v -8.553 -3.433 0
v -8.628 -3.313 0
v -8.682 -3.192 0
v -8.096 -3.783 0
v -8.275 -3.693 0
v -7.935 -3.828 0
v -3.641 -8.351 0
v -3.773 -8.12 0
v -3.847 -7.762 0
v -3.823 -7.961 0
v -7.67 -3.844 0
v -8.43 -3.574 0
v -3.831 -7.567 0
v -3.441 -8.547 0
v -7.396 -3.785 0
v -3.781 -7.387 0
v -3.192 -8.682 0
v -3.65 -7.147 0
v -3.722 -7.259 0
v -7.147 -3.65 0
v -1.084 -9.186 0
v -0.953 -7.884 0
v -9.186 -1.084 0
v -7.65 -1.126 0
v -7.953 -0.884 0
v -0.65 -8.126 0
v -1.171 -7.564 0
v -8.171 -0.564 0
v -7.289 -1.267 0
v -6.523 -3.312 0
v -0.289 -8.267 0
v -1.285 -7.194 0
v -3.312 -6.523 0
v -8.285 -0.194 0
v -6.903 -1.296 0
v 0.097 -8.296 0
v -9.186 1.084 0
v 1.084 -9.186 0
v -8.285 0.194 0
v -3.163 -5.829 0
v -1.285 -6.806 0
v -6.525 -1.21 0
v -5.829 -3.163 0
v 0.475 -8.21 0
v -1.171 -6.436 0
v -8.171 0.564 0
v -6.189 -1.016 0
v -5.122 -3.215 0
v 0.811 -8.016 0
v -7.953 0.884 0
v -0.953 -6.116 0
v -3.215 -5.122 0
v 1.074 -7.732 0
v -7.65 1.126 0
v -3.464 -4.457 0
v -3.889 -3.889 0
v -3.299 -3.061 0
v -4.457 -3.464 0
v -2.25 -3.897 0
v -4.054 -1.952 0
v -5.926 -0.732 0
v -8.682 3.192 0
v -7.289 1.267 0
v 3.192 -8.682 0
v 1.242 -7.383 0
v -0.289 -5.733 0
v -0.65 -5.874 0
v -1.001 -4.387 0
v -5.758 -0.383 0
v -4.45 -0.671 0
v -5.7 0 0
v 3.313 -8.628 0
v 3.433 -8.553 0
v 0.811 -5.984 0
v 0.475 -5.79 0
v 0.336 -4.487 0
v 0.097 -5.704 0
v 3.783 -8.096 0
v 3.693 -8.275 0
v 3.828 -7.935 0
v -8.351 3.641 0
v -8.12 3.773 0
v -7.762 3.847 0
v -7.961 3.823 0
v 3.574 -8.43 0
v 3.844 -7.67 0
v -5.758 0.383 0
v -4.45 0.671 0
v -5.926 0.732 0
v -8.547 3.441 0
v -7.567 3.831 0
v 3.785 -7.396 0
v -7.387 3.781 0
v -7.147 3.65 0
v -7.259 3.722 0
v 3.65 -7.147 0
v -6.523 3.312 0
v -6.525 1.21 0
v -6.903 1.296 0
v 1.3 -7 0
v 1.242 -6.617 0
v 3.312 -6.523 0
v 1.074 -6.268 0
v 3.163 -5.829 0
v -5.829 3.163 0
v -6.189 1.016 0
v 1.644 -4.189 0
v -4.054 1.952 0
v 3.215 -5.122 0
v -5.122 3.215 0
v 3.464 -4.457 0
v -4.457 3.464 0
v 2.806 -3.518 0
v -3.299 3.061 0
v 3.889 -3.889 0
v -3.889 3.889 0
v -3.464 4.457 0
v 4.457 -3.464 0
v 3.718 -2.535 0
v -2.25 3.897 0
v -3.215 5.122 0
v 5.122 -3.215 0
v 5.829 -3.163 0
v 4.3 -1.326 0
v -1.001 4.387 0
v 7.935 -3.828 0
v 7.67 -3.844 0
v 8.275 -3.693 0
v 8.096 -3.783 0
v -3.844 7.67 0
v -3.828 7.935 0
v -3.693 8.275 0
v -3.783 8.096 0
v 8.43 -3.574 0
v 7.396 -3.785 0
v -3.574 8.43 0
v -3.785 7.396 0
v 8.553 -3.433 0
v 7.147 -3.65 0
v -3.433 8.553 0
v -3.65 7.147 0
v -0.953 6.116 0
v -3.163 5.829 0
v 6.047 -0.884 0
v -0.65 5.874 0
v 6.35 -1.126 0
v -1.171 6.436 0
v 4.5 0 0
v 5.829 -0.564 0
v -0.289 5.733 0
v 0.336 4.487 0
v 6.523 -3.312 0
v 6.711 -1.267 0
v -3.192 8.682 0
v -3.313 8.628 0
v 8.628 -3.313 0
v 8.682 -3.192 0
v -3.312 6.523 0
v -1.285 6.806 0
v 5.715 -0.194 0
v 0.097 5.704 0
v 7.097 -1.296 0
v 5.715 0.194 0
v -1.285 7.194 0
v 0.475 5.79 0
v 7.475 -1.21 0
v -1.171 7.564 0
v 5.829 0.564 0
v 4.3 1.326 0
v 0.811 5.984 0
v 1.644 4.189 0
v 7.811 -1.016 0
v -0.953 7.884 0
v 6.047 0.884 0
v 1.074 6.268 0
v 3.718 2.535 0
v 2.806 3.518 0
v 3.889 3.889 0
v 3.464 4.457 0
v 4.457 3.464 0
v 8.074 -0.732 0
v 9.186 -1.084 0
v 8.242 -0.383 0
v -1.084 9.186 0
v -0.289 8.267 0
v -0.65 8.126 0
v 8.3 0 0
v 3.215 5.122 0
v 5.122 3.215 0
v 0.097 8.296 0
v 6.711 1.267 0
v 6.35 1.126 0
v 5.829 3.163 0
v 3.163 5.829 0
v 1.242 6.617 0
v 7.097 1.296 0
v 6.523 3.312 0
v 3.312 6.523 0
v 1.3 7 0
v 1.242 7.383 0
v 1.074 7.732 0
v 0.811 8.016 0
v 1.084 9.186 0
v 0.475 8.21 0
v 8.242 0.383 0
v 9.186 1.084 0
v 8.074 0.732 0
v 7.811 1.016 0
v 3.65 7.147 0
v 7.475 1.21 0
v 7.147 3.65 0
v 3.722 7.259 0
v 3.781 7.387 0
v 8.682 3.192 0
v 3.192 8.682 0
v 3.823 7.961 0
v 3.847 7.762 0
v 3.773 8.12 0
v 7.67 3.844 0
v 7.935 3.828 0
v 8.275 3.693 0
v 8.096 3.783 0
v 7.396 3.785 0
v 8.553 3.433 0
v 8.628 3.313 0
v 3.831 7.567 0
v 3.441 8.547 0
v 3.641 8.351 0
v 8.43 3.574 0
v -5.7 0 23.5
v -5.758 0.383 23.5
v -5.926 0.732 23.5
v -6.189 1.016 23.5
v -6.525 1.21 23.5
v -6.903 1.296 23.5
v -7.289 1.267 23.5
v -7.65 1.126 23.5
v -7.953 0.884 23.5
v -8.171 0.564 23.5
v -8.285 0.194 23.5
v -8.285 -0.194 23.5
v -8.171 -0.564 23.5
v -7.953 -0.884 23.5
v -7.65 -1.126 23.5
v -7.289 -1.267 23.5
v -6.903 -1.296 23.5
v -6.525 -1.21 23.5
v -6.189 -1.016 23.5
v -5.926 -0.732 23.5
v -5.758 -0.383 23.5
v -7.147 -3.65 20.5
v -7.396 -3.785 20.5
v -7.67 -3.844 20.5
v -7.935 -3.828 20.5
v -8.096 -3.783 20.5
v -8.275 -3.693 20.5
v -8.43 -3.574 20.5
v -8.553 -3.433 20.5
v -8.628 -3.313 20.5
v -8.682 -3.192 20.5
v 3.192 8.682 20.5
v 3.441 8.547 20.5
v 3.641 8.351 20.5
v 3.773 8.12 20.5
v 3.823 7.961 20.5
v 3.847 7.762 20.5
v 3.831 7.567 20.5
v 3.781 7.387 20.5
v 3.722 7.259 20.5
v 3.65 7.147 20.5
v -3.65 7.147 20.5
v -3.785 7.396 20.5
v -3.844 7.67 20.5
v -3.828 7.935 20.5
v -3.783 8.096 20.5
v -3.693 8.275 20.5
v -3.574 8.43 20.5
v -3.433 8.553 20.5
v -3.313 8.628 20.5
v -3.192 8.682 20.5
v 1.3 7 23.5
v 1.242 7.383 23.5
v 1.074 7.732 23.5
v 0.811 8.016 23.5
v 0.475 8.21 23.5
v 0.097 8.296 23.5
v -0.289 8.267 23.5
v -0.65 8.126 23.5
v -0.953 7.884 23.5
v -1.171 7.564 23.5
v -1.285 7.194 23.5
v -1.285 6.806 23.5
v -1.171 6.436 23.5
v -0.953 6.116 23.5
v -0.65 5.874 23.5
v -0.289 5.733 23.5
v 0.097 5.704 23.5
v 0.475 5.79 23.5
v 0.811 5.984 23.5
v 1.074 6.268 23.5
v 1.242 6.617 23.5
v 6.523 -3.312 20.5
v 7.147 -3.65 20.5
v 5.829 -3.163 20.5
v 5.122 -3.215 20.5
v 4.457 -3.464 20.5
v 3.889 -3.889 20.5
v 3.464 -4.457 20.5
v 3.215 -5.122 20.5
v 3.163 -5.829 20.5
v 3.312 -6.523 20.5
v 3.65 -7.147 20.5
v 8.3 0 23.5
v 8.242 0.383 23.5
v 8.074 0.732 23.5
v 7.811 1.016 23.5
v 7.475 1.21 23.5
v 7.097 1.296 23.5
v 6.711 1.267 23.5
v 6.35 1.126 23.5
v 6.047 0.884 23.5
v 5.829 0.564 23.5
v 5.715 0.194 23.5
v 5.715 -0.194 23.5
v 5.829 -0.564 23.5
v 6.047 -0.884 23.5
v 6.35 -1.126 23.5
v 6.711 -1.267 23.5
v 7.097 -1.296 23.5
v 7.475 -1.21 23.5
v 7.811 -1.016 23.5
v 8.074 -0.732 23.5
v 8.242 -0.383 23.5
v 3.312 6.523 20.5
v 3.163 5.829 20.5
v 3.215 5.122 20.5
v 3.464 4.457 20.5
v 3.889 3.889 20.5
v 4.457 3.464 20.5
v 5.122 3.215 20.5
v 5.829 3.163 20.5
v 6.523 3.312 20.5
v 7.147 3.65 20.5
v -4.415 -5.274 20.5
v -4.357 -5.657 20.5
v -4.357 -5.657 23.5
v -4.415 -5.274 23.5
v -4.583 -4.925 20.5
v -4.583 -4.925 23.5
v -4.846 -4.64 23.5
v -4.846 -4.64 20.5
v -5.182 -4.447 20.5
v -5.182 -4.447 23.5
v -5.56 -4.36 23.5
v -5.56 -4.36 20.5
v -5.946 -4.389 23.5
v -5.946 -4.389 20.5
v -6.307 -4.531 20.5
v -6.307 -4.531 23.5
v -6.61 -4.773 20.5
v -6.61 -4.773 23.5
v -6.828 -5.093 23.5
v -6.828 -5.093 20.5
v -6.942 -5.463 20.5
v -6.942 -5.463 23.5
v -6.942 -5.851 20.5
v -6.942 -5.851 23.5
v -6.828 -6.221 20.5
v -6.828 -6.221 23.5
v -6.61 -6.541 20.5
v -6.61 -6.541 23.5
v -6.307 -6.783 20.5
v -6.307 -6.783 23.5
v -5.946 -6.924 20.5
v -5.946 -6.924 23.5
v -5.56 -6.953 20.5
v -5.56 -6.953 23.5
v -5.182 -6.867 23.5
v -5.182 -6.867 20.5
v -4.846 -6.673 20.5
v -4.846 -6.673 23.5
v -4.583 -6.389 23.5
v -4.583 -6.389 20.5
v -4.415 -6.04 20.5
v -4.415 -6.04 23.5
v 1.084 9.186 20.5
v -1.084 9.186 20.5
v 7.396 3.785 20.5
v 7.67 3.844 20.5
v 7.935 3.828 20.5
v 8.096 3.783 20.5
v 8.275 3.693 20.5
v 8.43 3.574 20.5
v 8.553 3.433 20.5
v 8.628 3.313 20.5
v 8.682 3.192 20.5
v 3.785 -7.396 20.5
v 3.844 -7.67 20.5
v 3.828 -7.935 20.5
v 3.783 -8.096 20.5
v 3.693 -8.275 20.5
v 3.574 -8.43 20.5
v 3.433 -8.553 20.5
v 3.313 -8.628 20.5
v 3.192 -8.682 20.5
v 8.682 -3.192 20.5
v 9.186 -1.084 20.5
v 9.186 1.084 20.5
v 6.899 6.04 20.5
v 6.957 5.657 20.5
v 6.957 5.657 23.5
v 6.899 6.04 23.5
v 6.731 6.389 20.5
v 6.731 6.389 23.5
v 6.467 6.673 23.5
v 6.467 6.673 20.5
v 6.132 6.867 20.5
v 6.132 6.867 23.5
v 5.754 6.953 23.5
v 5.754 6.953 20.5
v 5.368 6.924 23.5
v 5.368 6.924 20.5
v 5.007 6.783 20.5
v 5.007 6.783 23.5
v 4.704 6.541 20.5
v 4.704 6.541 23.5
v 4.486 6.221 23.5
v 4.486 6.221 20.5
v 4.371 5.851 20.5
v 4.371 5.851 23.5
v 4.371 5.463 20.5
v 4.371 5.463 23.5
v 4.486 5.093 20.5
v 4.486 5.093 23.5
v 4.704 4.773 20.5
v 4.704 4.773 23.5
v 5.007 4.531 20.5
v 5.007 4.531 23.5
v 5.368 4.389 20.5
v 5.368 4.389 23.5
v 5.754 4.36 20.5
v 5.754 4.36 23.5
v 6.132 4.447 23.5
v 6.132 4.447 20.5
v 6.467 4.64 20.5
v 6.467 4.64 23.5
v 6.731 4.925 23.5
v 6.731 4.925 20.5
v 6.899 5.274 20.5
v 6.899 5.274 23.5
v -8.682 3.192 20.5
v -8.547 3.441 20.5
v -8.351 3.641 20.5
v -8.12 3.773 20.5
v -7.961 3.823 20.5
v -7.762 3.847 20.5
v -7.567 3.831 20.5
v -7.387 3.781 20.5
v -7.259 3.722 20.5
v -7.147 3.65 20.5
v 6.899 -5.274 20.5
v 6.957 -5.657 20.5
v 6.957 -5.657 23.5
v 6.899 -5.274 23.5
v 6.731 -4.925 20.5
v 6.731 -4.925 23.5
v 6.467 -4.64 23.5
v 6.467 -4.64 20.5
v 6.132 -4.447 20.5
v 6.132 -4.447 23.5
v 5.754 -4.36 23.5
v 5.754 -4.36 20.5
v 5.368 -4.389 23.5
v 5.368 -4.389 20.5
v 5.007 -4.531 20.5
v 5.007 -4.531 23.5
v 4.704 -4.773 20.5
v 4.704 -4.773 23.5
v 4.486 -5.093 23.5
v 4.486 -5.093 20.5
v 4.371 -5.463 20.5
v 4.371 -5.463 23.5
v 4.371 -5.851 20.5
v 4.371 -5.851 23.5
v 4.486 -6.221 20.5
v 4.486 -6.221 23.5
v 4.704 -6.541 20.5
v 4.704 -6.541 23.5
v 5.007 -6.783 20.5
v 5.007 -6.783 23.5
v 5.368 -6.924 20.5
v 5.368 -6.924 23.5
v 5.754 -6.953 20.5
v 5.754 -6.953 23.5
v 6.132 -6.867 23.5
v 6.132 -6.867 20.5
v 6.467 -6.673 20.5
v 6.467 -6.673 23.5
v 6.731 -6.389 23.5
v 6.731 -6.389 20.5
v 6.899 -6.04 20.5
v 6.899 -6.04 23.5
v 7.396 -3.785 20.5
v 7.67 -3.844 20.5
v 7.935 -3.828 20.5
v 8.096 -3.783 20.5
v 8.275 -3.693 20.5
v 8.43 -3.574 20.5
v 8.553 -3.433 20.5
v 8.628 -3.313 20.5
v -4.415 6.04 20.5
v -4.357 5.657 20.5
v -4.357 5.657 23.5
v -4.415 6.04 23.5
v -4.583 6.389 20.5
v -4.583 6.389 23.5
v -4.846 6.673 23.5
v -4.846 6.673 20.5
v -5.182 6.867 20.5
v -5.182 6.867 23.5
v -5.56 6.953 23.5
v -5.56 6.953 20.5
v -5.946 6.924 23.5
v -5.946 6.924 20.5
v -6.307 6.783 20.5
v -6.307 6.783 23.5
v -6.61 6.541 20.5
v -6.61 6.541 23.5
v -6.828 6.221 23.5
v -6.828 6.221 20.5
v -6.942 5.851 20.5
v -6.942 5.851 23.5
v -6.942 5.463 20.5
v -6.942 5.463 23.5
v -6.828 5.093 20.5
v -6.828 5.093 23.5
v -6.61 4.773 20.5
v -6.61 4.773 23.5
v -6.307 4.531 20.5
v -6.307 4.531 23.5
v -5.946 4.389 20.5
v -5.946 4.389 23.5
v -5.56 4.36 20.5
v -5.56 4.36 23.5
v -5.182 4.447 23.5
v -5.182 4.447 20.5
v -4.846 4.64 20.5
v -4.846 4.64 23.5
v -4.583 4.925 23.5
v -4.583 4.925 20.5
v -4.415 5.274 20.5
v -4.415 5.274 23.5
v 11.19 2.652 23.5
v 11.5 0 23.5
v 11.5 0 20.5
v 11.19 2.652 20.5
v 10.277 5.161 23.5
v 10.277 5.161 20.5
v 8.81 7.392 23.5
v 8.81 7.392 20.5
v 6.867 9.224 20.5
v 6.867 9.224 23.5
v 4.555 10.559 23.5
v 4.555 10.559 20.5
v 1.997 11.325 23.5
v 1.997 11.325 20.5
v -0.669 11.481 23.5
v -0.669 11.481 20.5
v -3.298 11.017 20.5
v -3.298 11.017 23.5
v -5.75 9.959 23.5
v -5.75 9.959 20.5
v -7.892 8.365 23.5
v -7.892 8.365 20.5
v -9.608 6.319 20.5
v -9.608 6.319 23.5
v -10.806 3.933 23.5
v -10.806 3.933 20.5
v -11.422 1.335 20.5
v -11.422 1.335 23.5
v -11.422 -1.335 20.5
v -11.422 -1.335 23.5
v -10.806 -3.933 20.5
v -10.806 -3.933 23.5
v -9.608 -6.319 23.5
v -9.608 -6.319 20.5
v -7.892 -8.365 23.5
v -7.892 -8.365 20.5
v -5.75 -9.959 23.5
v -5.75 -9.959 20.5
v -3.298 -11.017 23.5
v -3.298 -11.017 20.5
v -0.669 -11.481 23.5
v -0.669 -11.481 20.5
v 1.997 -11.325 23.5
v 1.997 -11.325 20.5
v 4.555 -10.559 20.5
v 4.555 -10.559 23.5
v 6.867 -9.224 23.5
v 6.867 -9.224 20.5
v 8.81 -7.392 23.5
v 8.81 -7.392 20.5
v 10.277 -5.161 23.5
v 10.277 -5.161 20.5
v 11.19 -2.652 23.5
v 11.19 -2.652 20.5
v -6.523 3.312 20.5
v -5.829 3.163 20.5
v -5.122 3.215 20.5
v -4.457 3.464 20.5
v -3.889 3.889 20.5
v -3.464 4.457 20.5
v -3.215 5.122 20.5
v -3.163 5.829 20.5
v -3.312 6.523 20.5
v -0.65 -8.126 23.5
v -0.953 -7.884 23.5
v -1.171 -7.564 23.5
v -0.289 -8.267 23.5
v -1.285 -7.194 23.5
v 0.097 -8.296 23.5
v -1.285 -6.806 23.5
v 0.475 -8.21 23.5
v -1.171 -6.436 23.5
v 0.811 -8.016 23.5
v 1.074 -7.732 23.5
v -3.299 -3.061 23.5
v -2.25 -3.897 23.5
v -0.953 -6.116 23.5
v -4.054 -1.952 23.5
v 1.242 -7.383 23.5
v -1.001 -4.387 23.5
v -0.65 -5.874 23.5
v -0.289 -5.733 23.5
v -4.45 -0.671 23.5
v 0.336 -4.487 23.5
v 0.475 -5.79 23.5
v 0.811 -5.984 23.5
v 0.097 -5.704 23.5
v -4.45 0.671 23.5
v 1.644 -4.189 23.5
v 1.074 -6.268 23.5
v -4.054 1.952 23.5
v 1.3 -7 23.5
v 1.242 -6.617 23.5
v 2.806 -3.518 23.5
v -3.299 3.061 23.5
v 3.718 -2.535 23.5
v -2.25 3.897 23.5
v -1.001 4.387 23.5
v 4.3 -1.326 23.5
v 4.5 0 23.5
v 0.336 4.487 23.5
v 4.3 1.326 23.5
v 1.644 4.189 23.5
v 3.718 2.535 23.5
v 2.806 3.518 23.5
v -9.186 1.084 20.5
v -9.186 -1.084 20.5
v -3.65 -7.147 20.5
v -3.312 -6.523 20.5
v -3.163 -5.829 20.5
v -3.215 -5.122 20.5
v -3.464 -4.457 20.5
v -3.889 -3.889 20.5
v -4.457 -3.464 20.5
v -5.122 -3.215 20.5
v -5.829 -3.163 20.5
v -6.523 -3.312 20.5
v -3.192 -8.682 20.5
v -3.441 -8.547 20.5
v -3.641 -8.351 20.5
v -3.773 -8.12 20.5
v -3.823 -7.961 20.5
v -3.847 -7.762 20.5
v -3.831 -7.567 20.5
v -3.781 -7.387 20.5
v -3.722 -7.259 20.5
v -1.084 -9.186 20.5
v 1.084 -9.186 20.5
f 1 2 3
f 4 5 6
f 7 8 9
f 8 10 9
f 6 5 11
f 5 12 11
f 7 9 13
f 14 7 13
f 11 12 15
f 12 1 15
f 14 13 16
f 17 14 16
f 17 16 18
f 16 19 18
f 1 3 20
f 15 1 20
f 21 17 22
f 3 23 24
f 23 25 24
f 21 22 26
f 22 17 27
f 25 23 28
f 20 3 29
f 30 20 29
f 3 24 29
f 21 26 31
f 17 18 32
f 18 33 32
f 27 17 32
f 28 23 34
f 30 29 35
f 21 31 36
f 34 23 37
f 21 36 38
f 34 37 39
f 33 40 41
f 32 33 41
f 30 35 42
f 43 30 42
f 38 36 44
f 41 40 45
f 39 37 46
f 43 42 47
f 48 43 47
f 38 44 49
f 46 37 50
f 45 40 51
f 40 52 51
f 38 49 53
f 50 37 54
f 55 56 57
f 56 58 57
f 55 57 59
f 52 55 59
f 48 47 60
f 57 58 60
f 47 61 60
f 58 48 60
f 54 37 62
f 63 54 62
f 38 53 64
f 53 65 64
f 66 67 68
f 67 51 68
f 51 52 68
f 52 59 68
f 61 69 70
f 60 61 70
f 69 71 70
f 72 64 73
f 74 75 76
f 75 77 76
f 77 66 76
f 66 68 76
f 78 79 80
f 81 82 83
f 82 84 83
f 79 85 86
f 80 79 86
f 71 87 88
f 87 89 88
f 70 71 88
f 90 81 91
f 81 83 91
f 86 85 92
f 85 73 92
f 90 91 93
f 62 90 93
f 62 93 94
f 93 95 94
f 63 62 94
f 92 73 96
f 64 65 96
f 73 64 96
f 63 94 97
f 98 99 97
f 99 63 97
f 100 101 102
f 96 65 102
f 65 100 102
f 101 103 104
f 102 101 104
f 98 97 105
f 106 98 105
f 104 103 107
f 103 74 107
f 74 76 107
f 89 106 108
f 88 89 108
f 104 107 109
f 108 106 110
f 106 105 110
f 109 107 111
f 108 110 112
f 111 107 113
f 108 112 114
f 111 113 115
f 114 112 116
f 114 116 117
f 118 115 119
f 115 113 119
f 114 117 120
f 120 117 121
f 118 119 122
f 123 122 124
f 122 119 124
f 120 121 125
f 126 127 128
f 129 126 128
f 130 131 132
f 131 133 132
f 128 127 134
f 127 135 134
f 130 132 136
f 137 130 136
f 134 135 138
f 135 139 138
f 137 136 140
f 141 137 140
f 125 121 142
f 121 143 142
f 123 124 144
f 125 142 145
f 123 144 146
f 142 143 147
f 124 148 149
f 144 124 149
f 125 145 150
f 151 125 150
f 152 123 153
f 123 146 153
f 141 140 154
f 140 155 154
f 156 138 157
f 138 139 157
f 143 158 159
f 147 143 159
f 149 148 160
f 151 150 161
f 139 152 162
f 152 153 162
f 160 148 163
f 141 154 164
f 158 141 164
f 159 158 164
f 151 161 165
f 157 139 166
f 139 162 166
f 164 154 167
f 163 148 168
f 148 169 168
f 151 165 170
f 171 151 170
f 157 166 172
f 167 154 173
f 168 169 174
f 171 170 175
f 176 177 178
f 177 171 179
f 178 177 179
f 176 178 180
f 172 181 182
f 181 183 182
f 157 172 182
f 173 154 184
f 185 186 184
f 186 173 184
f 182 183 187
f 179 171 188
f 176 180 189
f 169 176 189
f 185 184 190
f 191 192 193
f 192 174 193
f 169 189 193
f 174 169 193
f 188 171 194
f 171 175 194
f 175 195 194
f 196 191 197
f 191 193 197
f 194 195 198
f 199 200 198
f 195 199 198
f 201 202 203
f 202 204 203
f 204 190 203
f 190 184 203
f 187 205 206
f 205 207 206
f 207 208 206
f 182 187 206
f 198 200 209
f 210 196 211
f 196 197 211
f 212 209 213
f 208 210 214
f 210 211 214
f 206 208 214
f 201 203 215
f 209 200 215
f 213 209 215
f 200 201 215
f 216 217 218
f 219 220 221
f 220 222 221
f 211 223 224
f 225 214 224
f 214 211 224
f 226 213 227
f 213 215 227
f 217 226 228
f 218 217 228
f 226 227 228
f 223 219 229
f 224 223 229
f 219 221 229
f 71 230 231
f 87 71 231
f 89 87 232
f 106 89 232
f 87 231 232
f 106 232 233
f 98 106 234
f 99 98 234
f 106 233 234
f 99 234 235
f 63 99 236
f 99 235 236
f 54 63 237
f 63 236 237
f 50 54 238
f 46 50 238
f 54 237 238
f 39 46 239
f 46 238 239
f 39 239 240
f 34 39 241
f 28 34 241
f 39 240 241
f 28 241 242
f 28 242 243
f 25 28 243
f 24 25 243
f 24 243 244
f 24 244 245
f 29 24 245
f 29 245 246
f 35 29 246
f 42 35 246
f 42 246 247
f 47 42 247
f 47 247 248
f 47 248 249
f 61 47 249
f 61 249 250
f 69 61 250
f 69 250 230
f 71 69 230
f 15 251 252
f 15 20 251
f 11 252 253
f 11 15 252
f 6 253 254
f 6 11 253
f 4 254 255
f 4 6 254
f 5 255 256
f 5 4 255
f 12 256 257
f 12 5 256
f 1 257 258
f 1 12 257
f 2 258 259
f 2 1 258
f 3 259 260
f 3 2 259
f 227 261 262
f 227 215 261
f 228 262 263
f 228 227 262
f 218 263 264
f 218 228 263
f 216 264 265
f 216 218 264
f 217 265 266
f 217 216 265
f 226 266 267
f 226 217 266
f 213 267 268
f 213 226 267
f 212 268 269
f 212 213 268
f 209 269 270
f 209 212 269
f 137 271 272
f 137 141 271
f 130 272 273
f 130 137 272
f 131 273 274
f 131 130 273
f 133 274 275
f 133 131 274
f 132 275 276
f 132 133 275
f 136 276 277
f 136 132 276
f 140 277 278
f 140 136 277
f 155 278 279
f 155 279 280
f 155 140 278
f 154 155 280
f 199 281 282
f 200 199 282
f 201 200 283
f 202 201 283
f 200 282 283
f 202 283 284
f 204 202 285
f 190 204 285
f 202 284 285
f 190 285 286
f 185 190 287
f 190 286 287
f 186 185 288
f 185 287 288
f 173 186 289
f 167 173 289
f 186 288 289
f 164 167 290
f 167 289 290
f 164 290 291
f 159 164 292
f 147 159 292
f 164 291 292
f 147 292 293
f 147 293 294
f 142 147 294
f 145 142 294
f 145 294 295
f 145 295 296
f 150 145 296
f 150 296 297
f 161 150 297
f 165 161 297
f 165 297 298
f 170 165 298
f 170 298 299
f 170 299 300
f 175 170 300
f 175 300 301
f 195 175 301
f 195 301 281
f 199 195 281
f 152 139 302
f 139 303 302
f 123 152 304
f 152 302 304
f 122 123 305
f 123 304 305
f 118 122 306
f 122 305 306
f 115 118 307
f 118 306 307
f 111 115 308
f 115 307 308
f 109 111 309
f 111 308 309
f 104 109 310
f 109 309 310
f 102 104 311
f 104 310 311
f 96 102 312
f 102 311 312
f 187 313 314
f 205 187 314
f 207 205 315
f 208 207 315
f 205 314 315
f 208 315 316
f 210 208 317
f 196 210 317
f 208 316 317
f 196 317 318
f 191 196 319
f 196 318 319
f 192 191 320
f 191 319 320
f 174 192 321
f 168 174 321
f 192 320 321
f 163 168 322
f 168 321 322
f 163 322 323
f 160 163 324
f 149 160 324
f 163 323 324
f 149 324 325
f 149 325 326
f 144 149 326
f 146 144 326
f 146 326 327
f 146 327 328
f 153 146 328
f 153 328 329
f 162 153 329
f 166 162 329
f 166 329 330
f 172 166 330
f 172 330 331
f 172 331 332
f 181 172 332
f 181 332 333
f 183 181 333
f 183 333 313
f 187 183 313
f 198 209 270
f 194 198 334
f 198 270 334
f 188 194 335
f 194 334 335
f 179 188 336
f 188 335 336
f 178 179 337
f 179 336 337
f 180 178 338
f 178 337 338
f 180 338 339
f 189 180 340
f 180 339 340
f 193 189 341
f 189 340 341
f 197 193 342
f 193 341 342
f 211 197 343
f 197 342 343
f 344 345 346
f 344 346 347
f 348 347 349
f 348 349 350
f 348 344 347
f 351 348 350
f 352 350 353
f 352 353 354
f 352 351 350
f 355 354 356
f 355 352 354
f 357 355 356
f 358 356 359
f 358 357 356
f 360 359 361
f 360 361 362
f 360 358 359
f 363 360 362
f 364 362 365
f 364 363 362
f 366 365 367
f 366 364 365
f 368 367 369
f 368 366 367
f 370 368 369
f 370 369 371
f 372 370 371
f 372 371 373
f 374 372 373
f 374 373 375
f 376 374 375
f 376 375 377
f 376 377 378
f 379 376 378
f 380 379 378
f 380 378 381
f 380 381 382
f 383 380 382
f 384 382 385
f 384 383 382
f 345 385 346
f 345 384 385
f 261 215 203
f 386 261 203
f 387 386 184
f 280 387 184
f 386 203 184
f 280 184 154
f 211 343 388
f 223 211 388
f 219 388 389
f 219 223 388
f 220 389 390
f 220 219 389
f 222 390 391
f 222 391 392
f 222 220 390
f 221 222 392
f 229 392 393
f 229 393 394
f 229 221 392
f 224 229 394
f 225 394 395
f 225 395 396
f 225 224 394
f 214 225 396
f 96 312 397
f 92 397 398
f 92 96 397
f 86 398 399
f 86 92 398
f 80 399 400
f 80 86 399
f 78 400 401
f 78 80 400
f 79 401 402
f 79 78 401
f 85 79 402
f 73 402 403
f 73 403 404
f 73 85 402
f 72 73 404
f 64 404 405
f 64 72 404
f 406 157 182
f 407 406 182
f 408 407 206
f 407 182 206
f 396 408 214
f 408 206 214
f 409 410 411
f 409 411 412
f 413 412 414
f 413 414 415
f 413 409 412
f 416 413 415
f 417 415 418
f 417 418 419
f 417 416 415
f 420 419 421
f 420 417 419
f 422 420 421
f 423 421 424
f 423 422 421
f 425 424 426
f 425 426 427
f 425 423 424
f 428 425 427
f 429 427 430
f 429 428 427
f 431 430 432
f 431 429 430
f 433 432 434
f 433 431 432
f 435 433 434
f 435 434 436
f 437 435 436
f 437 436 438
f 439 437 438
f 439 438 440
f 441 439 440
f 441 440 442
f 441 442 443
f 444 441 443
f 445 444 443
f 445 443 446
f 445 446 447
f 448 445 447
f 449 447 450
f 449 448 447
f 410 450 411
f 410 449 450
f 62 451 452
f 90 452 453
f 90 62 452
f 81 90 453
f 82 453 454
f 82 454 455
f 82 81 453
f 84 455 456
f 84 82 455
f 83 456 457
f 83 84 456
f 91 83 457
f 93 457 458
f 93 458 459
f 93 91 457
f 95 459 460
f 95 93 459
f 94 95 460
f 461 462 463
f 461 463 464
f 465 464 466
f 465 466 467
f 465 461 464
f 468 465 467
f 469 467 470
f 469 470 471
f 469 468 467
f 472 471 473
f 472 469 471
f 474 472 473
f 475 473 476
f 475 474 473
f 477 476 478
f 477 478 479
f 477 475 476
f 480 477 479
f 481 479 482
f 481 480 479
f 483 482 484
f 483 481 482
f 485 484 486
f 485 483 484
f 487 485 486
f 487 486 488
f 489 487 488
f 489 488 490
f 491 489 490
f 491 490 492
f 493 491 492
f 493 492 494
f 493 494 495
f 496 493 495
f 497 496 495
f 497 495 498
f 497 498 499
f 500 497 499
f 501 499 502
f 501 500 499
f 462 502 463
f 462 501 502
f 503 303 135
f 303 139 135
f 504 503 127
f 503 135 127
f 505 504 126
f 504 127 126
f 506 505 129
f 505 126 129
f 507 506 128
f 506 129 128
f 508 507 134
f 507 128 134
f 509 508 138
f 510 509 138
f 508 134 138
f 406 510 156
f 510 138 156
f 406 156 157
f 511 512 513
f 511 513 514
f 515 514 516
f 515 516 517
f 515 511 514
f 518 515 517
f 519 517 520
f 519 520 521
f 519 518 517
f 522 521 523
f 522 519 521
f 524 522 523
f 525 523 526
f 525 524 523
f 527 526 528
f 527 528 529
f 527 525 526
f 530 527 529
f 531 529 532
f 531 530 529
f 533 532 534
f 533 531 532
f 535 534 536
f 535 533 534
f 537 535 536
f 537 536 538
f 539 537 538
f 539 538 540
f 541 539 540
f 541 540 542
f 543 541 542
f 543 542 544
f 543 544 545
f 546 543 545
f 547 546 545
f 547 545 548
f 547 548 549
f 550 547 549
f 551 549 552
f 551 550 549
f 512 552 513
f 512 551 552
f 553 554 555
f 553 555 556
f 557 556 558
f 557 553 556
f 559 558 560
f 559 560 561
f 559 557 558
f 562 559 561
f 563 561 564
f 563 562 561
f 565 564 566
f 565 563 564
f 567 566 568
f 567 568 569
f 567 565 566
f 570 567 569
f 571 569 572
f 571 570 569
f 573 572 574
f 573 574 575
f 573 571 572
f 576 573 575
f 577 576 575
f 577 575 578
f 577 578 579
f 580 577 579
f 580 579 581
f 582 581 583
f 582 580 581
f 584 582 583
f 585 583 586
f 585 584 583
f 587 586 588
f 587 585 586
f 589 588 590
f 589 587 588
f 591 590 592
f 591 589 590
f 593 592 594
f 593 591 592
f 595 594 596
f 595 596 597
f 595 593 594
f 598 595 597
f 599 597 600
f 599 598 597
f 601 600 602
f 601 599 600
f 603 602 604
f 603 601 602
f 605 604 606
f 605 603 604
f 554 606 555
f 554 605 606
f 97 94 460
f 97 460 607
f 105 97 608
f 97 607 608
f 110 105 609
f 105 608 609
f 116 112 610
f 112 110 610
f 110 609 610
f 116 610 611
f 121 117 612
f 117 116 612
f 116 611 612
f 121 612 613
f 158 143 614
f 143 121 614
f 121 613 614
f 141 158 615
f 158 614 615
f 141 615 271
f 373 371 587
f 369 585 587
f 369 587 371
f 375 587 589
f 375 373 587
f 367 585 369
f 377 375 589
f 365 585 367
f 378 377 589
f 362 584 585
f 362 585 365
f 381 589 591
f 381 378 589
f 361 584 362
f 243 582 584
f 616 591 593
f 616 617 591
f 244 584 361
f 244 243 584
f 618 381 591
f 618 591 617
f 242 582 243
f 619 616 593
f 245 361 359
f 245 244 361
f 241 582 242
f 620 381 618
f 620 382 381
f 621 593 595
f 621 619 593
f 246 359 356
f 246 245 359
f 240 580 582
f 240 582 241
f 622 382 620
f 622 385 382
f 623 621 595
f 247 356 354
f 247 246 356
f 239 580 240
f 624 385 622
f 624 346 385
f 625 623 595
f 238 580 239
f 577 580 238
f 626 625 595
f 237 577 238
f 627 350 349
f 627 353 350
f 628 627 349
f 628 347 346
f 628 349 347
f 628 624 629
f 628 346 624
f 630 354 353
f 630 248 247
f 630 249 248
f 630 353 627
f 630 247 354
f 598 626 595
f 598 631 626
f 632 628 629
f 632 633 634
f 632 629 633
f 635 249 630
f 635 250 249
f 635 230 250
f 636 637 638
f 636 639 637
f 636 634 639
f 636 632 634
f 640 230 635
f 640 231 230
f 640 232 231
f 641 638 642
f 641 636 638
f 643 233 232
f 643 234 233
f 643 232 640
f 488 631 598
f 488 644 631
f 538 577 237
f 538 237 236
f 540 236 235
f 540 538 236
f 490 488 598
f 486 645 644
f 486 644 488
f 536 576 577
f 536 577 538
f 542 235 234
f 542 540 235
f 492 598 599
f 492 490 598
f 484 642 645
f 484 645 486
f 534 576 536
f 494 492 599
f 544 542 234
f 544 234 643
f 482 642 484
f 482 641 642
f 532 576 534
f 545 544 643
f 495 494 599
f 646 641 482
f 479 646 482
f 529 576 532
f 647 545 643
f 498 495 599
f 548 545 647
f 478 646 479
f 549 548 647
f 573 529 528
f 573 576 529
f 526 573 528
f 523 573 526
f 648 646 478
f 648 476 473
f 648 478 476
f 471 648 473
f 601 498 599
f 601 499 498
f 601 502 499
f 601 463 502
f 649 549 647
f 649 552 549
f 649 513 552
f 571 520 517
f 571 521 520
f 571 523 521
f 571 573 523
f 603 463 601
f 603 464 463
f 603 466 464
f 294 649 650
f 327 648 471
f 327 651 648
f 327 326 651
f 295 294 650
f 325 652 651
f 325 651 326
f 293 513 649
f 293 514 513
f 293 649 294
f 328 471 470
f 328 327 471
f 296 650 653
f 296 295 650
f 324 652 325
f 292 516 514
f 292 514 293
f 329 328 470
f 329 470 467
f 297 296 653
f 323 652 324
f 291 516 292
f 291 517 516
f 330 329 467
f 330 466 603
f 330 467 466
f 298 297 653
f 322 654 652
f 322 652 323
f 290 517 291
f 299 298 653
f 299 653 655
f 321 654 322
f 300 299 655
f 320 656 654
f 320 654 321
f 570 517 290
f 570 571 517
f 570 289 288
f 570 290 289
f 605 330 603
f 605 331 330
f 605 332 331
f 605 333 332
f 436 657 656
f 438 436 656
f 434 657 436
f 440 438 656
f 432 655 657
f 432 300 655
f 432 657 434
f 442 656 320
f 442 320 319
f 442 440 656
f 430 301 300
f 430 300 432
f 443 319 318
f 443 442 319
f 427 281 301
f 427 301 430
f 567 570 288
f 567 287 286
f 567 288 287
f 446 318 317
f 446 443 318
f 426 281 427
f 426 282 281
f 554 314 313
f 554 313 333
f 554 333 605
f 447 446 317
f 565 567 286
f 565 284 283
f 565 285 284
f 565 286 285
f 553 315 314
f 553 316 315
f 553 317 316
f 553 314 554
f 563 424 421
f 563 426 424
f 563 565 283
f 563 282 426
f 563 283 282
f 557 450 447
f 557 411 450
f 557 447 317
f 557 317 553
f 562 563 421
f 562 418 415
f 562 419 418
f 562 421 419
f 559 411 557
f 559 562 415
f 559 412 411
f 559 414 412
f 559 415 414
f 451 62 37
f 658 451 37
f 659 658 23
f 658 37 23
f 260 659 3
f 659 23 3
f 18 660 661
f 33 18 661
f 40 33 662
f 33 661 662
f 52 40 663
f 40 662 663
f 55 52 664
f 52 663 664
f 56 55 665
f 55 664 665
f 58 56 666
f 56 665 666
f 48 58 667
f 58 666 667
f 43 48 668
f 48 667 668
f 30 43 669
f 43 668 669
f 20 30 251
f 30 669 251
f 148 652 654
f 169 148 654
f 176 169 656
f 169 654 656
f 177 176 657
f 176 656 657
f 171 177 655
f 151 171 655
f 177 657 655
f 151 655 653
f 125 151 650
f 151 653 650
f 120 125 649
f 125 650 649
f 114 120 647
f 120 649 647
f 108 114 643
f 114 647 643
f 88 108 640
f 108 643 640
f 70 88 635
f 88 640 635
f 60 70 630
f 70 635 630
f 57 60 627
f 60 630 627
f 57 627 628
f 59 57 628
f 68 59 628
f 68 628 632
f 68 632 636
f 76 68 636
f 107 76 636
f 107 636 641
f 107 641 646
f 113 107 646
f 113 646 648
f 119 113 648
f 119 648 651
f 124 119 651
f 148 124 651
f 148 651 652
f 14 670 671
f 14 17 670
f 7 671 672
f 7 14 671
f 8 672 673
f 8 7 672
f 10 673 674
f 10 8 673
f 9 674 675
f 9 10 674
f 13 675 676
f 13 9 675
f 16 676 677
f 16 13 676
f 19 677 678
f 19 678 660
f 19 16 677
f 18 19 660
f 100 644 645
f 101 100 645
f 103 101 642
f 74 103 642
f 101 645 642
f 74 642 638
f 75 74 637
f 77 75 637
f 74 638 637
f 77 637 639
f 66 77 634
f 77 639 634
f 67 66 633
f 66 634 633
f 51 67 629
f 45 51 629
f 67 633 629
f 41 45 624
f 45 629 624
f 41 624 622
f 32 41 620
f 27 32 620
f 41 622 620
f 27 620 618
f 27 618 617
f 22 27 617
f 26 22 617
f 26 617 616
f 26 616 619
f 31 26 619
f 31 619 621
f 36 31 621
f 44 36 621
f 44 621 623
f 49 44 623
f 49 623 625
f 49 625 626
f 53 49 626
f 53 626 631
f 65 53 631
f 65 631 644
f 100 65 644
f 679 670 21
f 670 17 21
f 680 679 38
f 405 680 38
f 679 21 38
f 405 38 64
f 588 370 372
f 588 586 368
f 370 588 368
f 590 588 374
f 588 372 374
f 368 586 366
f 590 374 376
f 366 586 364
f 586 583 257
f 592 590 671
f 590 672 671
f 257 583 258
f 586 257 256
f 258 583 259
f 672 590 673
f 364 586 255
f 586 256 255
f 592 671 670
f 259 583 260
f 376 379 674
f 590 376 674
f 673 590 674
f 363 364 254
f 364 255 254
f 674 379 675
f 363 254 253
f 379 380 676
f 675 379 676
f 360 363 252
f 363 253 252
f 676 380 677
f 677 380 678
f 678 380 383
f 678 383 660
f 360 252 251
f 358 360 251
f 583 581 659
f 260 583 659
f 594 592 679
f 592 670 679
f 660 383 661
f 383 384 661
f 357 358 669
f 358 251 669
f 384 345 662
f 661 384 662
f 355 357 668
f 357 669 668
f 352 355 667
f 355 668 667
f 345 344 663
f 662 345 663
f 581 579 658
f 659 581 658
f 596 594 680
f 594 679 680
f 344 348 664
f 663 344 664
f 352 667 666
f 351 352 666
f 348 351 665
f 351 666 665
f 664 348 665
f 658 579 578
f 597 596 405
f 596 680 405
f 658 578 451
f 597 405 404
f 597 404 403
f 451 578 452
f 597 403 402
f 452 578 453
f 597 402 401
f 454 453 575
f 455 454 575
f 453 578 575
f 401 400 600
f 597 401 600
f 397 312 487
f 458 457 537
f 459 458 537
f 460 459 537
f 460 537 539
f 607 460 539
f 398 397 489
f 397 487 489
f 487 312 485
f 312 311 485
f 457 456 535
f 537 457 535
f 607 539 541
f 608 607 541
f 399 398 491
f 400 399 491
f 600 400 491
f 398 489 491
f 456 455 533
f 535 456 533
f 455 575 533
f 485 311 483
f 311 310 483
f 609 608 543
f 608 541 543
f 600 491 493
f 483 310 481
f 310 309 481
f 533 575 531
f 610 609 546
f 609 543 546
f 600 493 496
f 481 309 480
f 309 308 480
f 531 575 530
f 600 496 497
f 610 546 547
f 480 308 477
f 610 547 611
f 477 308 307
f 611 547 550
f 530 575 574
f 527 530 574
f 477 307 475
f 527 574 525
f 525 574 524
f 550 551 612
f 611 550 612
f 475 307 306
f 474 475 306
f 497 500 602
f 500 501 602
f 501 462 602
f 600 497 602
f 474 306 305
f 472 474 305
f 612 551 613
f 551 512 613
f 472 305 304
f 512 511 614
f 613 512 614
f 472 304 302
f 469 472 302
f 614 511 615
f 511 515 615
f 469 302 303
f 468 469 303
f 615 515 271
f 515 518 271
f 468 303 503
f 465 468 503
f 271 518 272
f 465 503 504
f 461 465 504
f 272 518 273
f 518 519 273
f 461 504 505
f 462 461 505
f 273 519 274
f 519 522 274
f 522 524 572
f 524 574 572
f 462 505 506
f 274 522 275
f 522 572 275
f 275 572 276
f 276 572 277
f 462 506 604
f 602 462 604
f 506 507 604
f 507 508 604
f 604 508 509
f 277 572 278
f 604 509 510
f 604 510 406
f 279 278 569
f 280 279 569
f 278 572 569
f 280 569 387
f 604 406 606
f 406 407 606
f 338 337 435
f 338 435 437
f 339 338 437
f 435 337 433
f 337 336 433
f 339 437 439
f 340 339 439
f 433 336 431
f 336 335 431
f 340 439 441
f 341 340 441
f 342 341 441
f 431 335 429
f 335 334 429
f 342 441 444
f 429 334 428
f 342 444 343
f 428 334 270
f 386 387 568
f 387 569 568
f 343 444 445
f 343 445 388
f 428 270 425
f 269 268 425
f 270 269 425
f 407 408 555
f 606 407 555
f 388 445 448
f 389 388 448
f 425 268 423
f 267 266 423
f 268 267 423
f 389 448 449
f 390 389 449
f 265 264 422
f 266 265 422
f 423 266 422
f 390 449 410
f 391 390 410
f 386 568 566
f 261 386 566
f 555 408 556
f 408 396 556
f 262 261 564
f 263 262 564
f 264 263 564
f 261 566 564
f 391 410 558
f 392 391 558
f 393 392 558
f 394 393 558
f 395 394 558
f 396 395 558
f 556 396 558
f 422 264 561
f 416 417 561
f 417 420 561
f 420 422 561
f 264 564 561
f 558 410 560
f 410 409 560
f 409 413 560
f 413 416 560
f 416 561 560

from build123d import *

# Parameters (mm, degrees)
ESQUISSE1_R                  = 9.25
BOSS_EXTRU_1_DEPTH           = 23.5
ESQUISSE2_R                  = 1.3
ENL_V_MAT_EXTRU_1_DEPTH      = 1
ENL_V_MAT_EXTRU_1_DEPTH_BACK = 24.5
ESQUISSE3_R                  = 4.5
ENL_V_MAT_EXTRU_2_DEPTH      = 1
ENL_V_MAT_EXTRU_2_DEPTH_BACK = 24.5
ESQUISSE4_R                  = 11.5
ESQUISSE4_R_2                = 9.25
BOSS_EXTRU_2_DEPTH           = 3
ESQUISSE5_R                  = 2.5
ENL_V_MAT_EXTRU_3_DEPTH      = 1
ENL_V_MAT_EXTRU_3_DEPTH_BACK = 24.5
BOSS_EXTRU_3_START           = -3
ESQUISSE6_R                  = 2.5
ESQUISSE6_R_2                = 1.3
BOSS_EXTRU_3_DEPTH           = 3
CONG_1_R                     = 1


with BuildPart() as part:
    # Esquisse1 → Boss.-Extru.1 (new body)
    with BuildSketch(Plane.XY):
        Circle(ESQUISSE1_R)
    extrude(amount=BOSS_EXTRU_1_DEPTH)

    # Esquisse2 → Enlèv. mat.-Extru.1 (cut, two sides)
    with BuildSketch(Plane.XY.offset(23.5)) as enl_v_mat_extru_1_sk:
        with Locations((7, 0)):
            Circle(ESQUISSE2_R)
        with Locations((0, -7)):
            Circle(ESQUISSE2_R)
        with Locations((-7, 0)):
            Circle(ESQUISSE2_R)
        with Locations((0, 7)):
            Circle(ESQUISSE2_R)
    extrude(amount=ENL_V_MAT_EXTRU_1_DEPTH, mode=Mode.SUBTRACT)
    extrude(enl_v_mat_extru_1_sk.sketch, amount=-ENL_V_MAT_EXTRU_1_DEPTH_BACK, mode=Mode.SUBTRACT)

    # Esquisse3 → Enlèv. mat.-Extru.2 (cut, two sides)
    with BuildSketch(Plane.XY.offset(23.5)) as enl_v_mat_extru_2_sk:
        Circle(ESQUISSE3_R)
    extrude(amount=ENL_V_MAT_EXTRU_2_DEPTH, mode=Mode.SUBTRACT)
    extrude(enl_v_mat_extru_2_sk.sketch, amount=-ENL_V_MAT_EXTRU_2_DEPTH_BACK, mode=Mode.SUBTRACT)

    # Esquisse4 → Boss.-Extru.2 (add)
    with BuildSketch(Plane.XY.offset(23.5)):
        Circle(ESQUISSE4_R)
        Circle(ESQUISSE4_R_2, mode=Mode.SUBTRACT)
    extrude(amount=-BOSS_EXTRU_2_DEPTH)

    # Esquisse5 → Enlèv. mat.-Extru.3 (cut, two sides)
    with BuildSketch(Plane.XY.offset(23.5)) as enl_v_mat_extru_3_sk:
        with Locations((5.656854249, 5.656854249)):
            Circle(ESQUISSE5_R)
        with Locations((5.656854249, -5.656854249)):
            Circle(ESQUISSE5_R)
        with Locations((-5.656854249, -5.656854249)):
            Circle(ESQUISSE5_R)
        with Locations((-5.656854249, 5.656854249)):
            Circle(ESQUISSE5_R)
    extrude(amount=ENL_V_MAT_EXTRU_3_DEPTH, mode=Mode.SUBTRACT)
    extrude(enl_v_mat_extru_3_sk.sketch, amount=-ENL_V_MAT_EXTRU_3_DEPTH_BACK, mode=Mode.SUBTRACT)

    # Esquisse6 → Boss.-Extru.3 (add)
    with BuildSketch(Plane.XY.offset(23.5).offset(BOSS_EXTRU_3_START)):
        with Locations((-5.656854249, 5.656854249)):
            Circle(ESQUISSE6_R)
        with Locations((-5.656854249, 5.656854249)):
            Circle(ESQUISSE6_R_2, mode=Mode.SUBTRACT)
        with Locations((5.656854249, 5.656854249)):
            Circle(ESQUISSE6_R)
        with Locations((5.656854249, 5.656854249)):
            Circle(ESQUISSE6_R_2, mode=Mode.SUBTRACT)
        with Locations((5.656854249, -5.656854249)):
            Circle(ESQUISSE6_R)
        with Locations((5.656854249, -5.656854249)):
            Circle(ESQUISSE6_R_2, mode=Mode.SUBTRACT)
        with Locations((-5.656854249, -5.656854249)):
            Circle(ESQUISSE6_R)
        with Locations((-5.656854249, -5.656854249)):
            Circle(ESQUISSE6_R_2, mode=Mode.SUBTRACT)
    extrude(amount=BOSS_EXTRU_3_DEPTH)

    # Congé1
    cong_1_edges = [part.edges().sort_by_distance(p)[0] for p in [
        (7.966686716, 4.700468356, 10.25),
        (4.700468356, 7.966686716, 10.25),
        (4.700468356, -7.966686716, 10.25),
        (7.966686716, -4.700468356, 10.25),
        (-7.966686716, -4.700468356, 10.25),
        (-4.700468356, -7.966686716, 10.25),
        (-4.700468356, 7.966686716, 10.25),
        (-7.966686716, 4.700468356, 10.25),
    ]]
    fillet(cong_1_edges, radius=CONG_1_R)


solid = part.part
